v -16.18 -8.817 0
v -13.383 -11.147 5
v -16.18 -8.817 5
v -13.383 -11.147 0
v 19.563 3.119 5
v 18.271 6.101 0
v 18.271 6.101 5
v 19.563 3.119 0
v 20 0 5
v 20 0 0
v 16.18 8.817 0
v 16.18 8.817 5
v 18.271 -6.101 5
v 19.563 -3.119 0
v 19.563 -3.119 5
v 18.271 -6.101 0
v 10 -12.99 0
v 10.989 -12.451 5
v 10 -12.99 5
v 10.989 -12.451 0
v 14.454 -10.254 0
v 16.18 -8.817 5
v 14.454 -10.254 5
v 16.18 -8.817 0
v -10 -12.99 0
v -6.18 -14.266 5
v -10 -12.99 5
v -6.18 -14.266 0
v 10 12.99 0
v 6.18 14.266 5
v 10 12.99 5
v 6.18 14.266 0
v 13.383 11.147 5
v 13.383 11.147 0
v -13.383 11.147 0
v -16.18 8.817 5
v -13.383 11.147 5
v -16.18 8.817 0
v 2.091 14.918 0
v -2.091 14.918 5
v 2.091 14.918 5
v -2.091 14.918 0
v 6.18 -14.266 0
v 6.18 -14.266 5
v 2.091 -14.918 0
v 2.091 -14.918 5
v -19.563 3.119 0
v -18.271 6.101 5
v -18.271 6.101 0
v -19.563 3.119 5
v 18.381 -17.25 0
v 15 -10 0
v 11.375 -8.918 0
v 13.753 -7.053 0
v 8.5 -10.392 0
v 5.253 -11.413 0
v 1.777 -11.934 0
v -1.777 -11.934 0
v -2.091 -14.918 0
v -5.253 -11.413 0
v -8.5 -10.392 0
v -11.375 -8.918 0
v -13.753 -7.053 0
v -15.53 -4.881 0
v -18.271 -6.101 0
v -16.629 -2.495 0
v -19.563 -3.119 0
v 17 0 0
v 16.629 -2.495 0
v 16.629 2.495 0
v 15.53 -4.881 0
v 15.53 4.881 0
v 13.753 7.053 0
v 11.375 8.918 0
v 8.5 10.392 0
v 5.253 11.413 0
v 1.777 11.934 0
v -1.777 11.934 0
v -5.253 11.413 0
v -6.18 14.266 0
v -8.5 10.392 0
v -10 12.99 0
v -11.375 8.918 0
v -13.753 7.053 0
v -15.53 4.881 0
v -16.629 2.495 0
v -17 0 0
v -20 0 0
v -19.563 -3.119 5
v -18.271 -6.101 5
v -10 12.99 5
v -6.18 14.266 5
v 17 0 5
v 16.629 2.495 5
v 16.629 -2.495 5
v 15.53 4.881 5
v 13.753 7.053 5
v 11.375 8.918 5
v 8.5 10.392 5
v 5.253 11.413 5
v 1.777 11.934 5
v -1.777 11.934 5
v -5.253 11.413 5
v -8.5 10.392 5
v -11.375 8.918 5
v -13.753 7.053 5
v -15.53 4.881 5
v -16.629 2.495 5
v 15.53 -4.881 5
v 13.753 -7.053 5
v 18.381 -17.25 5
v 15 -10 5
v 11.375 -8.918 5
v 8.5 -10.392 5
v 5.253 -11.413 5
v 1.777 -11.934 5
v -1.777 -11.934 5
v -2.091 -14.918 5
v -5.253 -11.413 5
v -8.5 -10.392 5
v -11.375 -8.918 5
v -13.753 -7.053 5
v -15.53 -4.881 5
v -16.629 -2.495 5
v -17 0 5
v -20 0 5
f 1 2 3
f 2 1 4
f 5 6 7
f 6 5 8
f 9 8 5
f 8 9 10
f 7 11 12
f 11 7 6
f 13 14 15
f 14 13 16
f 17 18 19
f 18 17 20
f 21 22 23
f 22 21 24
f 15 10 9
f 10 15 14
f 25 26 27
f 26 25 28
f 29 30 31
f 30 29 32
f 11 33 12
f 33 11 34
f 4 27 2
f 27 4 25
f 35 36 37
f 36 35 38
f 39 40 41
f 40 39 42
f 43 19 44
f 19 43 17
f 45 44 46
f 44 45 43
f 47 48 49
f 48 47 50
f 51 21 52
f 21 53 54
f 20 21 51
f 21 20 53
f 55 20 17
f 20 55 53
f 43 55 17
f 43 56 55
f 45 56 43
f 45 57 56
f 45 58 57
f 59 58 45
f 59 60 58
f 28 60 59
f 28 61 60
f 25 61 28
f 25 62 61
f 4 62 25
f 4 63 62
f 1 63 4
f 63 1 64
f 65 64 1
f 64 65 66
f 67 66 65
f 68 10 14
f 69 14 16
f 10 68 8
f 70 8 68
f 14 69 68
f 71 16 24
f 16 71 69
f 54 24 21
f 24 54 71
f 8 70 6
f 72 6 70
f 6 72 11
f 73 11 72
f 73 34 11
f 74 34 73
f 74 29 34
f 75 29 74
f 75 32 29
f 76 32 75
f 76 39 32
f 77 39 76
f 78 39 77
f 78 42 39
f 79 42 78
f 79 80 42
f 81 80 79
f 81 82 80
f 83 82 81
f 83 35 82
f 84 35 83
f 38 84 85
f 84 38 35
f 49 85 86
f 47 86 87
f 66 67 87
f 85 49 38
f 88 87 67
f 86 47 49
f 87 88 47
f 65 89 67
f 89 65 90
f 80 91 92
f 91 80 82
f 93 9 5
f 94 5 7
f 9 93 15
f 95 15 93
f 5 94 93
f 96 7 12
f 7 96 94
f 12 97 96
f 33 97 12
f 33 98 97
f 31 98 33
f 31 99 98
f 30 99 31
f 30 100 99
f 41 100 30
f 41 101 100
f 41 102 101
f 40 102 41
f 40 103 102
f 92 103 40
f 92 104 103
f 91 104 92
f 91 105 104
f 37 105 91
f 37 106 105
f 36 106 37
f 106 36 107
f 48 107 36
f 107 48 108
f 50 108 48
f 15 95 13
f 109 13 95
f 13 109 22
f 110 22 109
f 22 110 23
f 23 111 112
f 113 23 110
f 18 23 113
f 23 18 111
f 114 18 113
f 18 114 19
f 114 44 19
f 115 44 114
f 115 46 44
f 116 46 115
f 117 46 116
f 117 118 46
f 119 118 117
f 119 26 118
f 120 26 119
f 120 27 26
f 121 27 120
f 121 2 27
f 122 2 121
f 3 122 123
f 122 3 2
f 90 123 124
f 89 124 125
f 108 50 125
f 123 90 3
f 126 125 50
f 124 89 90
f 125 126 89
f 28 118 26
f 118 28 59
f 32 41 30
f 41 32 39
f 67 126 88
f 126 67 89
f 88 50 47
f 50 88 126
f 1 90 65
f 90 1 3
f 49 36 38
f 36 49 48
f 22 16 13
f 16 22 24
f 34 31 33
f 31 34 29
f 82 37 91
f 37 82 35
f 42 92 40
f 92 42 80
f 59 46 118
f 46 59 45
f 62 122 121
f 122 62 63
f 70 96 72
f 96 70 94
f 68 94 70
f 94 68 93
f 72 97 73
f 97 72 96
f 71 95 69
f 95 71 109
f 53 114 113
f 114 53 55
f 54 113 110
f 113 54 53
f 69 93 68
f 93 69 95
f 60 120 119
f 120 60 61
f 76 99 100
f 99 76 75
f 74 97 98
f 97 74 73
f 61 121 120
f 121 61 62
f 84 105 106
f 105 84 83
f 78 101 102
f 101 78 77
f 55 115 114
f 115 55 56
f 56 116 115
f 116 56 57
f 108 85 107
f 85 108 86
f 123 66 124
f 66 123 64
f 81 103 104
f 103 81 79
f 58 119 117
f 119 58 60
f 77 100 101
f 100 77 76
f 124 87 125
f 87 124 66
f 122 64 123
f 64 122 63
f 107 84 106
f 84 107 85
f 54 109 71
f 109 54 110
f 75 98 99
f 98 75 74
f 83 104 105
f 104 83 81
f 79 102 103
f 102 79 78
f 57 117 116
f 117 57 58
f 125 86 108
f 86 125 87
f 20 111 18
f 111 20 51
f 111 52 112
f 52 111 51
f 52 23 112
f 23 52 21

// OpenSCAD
// file: ../../../open-oval/open-oval.scad
use <MCAD/shapes.scad>
//use </usr/share/openscad/libraries/MCAD/shapes.scad>
//use </Applications/OpenSCAD.app/Contents/Resources/libraries/MCAD/shapes.scad>

module openOval(yLength = 10)
{
	openOval2d(height = yLength);
}

/** Support functions and modules follow.  **/

module openOval2d(borderThickness = 3,
				  depth = 5,
				  height = 10,
				  width = 20)
{
	difference()
	{
		ellipticalCylinder(w = width, h = height, height = depth);

		w = width - borderThickness;
		h = height - borderThickness;
		translate([0, 0, -0.01])
		ellipticalCylinder(w = w, h = h, height = depth + 0.02);
	}
}
// file: ../../dialog-bubble.scad
use <../open-oval/open-oval.scad>

use <MCAD/triangles.scad>

module dialogBubble(trangleRotateZ = 25,
					yLength = 10)
{
	difference()
	{
		dialogBubble_block(trangleRotateZ,
							yLength);

		dialogBubble_cutouts();
	}
}

/** Support functions and modules follow.  **/

module dialogBubble_block(trangleRotateZ, yLength)
{
	union()
	{
//		% // transparent
		openOval(yLength = yLength);

		yTranslate = -5;
		yTranslate = -yLength + 5;

		rotateZ = trangleRotateZ;
		translate([15, yTranslate, 0])
		rotate([0, 0, rotateZ])
		triangle(o_len = -8, a_len = -5, depth=5);
	}
}

module dialogBubble_cutouts(trangleRotateZ)
{

}

module dialogBubble_pointer()
{

}
// main file
use <../../dialog-bubble.scad>

dialogBubble(yLength = 15);
